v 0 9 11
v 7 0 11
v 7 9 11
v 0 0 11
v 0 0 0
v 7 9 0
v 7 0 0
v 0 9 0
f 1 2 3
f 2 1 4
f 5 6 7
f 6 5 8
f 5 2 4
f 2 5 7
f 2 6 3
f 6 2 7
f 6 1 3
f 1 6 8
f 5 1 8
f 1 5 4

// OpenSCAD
// Generated by SolidPython 1.0.1 on 2020-07-29 00:46:55


cube(size = [7, 9, 11]);
/***********************************************
*********      SolidPython code:      **********
************************************************
 
# import packages: SolidPython
from solid import *
from solid.utils import *
from itertools import chain, combinations, permutations


class Resize:

    def __init__(self, scad_file):
        self.scad_file = scad_file
        #self.scad_file = import_scad(scad_file)
        # cone/cylinder param:
        self.r1 = 0
        self.r2 = 0
        self.h = 0
        # rectangular prism param:
        self.w = 0
        self.l = 0
        # ellipse param:
        self.r = 0

    # import OpenScad code (file name corresponds to shape)


    # classify shape + parameters
    def assign(self, param1, param2, param3):
        if self.scad_file == 'cone.scad':
            self.r1 = param1
            self.r2 = param2
            self.h = param3
        elif self.scad_file == 'cylinder.scad':
            self.r1 = param1
            self.r2 = param2
            self.h = param3
        elif self.scad_file == 'rectangularPrism.scad':
            self.h = param1
            self.l = param2
            self.w = param3
        else:
            self.r = param1
            self.h = param2

    # resize parameters
    def iterate(self):
        x = range(3, 20, 2)
        i = 1
        if self.scad_file == 'cone.scad':
            tempList = list(permutations(x, 2))
            for temp in tempList:
                param1 = temp[0]
                param2 = temp[1]
                filepath = 'produced_scad_files/' + 'cone' + str(param1) + '_' + str(param2) + '_' + '.scad'
                scad_render_to_file(cylinder(h=param1, r1=param2, r2=0), filepath)

        elif self.scad_file == 'cylinder.scad':
            tempList = list(permutations(x, 3))
            for temp in tempList:
                param1 = temp[0]
                param2 = temp[1]
                filepath = 'produced_scad_files/' + 'cylinder' + str(param1) + '_' + str(param2) + '_' + '.scad'
                scad_render_to_file(cylinder(h=param1, r1=param2, r2=param2), filepath)

        elif self.scad_file == 'rectangularPrism.scad':
            tempList = list(permutations(x, 3))
            for temp in tempList:
                param1 = temp[0]
                param2 = temp[1]
                param3 = temp[2]
                filepath = 'produced_scad_files/' + 'rectangularPrism' + str(param1) + '_' + str(param2) + '_' + str(
                    param3) + '.scad'
                scad_render_to_file(cube(size=(param1, param2, param3)), filepath)

        elif self.scad_file == 'ellipse.scad':
            tempList = list(permutations(x, 4))
            for temp in tempList:
                param1 = temp[0]
                param2 = temp[1]
                param3 = temp[2]
                param4 = temp[3]
                filepath = 'produced_scad_files/' + 'ellipse' + str(param1) + '_' + str(param2) + '_' + str(param3) + '_' + str(param4) + '.scad'
                scad_render_to_file(scale([param1, param2, param3])(sphere(r=param4)), filepath)

    def render_to_scadfile(self):
        scad_render_to_file(scad, 'example.scad') 
 
************************************************/
